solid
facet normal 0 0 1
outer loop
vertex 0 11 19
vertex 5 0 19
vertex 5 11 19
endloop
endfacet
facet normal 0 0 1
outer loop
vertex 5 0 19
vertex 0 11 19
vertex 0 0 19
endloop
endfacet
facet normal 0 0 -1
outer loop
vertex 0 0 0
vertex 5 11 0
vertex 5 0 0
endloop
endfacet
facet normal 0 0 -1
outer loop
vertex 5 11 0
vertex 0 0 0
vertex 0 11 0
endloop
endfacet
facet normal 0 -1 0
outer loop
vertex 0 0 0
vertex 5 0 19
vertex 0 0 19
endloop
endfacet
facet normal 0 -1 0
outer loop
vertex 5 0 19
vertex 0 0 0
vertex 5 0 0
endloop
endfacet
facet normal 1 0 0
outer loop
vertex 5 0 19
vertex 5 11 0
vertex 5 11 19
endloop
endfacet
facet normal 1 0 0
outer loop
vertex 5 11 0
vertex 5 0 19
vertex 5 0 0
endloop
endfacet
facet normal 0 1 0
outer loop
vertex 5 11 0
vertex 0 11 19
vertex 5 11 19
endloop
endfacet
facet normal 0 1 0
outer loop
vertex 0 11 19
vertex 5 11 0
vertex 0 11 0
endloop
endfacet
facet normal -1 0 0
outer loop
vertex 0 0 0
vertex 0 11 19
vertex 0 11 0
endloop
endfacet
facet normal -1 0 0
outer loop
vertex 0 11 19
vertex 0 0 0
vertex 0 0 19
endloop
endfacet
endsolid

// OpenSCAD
// Generated by SolidPython 1.0.1 on 2020-07-29 00:46:54


cube(size = [5, 11, 19]);
/***********************************************
*********      SolidPython code:      **********
************************************************
 
# import packages: SolidPython
from solid import *
from solid.utils import *
from itertools import chain, combinations, permutations


class Resize:

    def __init__(self, scad_file):
        self.scad_file = scad_file
        #self.scad_file = import_scad(scad_file)
        # cone/cylinder param:
        self.r1 = 0
        self.r2 = 0
        self.h = 0
        # rectangular prism param:
        self.w = 0
        self.l = 0
        # ellipse param:
        self.r = 0

    # import OpenScad code (file name corresponds to shape)


    # classify shape + parameters
    def assign(self, param1, param2, param3):
        if self.scad_file == 'cone.scad':
            self.r1 = param1
            self.r2 = param2
            self.h = param3
        elif self.scad_file == 'cylinder.scad':
            self.r1 = param1
            self.r2 = param2
            self.h = param3
        elif self.scad_file == 'rectangularPrism.scad':
            self.h = param1
            self.l = param2
            self.w = param3
        else:
            self.r = param1
            self.h = param2

    # resize parameters
    def iterate(self):
        x = range(3, 20, 2)
        i = 1
        if self.scad_file == 'cone.scad':
            tempList = list(permutations(x, 2))
            for temp in tempList:
                param1 = temp[0]
                param2 = temp[1]
                filepath = 'produced_scad_files/' + 'cone' + str(param1) + '_' + str(param2) + '_' + '.scad'
                scad_render_to_file(cylinder(h=param1, r1=param2, r2=0), filepath)

        elif self.scad_file == 'cylinder.scad':
            tempList = list(permutations(x, 3))
            for temp in tempList:
                param1 = temp[0]
                param2 = temp[1]
                filepath = 'produced_scad_files/' + 'cylinder' + str(param1) + '_' + str(param2) + '_' + '.scad'
                scad_render_to_file(cylinder(h=param1, r1=param2, r2=param2), filepath)

        elif self.scad_file == 'rectangularPrism.scad':
            tempList = list(permutations(x, 3))
            for temp in tempList:
                param1 = temp[0]
                param2 = temp[1]
                param3 = temp[2]
                filepath = 'produced_scad_files/' + 'rectangularPrism' + str(param1) + '_' + str(param2) + '_' + str(
                    param3) + '.scad'
                scad_render_to_file(cube(size=(param1, param2, param3)), filepath)

        elif self.scad_file == 'ellipse.scad':
            tempList = list(permutations(x, 4))
            for temp in tempList:
                param1 = temp[0]
                param2 = temp[1]
                param3 = temp[2]
                param4 = temp[3]
                filepath = 'produced_scad_files/' + 'ellipse' + str(param1) + '_' + str(param2) + '_' + str(param3) + '_' + str(param4) + '.scad'
                scad_render_to_file(scale([param1, param2, param3])(sphere(r=param4)), filepath)

    def render_to_scadfile(self):
        scad_render_to_file(scad, 'example.scad') 
 
************************************************/
